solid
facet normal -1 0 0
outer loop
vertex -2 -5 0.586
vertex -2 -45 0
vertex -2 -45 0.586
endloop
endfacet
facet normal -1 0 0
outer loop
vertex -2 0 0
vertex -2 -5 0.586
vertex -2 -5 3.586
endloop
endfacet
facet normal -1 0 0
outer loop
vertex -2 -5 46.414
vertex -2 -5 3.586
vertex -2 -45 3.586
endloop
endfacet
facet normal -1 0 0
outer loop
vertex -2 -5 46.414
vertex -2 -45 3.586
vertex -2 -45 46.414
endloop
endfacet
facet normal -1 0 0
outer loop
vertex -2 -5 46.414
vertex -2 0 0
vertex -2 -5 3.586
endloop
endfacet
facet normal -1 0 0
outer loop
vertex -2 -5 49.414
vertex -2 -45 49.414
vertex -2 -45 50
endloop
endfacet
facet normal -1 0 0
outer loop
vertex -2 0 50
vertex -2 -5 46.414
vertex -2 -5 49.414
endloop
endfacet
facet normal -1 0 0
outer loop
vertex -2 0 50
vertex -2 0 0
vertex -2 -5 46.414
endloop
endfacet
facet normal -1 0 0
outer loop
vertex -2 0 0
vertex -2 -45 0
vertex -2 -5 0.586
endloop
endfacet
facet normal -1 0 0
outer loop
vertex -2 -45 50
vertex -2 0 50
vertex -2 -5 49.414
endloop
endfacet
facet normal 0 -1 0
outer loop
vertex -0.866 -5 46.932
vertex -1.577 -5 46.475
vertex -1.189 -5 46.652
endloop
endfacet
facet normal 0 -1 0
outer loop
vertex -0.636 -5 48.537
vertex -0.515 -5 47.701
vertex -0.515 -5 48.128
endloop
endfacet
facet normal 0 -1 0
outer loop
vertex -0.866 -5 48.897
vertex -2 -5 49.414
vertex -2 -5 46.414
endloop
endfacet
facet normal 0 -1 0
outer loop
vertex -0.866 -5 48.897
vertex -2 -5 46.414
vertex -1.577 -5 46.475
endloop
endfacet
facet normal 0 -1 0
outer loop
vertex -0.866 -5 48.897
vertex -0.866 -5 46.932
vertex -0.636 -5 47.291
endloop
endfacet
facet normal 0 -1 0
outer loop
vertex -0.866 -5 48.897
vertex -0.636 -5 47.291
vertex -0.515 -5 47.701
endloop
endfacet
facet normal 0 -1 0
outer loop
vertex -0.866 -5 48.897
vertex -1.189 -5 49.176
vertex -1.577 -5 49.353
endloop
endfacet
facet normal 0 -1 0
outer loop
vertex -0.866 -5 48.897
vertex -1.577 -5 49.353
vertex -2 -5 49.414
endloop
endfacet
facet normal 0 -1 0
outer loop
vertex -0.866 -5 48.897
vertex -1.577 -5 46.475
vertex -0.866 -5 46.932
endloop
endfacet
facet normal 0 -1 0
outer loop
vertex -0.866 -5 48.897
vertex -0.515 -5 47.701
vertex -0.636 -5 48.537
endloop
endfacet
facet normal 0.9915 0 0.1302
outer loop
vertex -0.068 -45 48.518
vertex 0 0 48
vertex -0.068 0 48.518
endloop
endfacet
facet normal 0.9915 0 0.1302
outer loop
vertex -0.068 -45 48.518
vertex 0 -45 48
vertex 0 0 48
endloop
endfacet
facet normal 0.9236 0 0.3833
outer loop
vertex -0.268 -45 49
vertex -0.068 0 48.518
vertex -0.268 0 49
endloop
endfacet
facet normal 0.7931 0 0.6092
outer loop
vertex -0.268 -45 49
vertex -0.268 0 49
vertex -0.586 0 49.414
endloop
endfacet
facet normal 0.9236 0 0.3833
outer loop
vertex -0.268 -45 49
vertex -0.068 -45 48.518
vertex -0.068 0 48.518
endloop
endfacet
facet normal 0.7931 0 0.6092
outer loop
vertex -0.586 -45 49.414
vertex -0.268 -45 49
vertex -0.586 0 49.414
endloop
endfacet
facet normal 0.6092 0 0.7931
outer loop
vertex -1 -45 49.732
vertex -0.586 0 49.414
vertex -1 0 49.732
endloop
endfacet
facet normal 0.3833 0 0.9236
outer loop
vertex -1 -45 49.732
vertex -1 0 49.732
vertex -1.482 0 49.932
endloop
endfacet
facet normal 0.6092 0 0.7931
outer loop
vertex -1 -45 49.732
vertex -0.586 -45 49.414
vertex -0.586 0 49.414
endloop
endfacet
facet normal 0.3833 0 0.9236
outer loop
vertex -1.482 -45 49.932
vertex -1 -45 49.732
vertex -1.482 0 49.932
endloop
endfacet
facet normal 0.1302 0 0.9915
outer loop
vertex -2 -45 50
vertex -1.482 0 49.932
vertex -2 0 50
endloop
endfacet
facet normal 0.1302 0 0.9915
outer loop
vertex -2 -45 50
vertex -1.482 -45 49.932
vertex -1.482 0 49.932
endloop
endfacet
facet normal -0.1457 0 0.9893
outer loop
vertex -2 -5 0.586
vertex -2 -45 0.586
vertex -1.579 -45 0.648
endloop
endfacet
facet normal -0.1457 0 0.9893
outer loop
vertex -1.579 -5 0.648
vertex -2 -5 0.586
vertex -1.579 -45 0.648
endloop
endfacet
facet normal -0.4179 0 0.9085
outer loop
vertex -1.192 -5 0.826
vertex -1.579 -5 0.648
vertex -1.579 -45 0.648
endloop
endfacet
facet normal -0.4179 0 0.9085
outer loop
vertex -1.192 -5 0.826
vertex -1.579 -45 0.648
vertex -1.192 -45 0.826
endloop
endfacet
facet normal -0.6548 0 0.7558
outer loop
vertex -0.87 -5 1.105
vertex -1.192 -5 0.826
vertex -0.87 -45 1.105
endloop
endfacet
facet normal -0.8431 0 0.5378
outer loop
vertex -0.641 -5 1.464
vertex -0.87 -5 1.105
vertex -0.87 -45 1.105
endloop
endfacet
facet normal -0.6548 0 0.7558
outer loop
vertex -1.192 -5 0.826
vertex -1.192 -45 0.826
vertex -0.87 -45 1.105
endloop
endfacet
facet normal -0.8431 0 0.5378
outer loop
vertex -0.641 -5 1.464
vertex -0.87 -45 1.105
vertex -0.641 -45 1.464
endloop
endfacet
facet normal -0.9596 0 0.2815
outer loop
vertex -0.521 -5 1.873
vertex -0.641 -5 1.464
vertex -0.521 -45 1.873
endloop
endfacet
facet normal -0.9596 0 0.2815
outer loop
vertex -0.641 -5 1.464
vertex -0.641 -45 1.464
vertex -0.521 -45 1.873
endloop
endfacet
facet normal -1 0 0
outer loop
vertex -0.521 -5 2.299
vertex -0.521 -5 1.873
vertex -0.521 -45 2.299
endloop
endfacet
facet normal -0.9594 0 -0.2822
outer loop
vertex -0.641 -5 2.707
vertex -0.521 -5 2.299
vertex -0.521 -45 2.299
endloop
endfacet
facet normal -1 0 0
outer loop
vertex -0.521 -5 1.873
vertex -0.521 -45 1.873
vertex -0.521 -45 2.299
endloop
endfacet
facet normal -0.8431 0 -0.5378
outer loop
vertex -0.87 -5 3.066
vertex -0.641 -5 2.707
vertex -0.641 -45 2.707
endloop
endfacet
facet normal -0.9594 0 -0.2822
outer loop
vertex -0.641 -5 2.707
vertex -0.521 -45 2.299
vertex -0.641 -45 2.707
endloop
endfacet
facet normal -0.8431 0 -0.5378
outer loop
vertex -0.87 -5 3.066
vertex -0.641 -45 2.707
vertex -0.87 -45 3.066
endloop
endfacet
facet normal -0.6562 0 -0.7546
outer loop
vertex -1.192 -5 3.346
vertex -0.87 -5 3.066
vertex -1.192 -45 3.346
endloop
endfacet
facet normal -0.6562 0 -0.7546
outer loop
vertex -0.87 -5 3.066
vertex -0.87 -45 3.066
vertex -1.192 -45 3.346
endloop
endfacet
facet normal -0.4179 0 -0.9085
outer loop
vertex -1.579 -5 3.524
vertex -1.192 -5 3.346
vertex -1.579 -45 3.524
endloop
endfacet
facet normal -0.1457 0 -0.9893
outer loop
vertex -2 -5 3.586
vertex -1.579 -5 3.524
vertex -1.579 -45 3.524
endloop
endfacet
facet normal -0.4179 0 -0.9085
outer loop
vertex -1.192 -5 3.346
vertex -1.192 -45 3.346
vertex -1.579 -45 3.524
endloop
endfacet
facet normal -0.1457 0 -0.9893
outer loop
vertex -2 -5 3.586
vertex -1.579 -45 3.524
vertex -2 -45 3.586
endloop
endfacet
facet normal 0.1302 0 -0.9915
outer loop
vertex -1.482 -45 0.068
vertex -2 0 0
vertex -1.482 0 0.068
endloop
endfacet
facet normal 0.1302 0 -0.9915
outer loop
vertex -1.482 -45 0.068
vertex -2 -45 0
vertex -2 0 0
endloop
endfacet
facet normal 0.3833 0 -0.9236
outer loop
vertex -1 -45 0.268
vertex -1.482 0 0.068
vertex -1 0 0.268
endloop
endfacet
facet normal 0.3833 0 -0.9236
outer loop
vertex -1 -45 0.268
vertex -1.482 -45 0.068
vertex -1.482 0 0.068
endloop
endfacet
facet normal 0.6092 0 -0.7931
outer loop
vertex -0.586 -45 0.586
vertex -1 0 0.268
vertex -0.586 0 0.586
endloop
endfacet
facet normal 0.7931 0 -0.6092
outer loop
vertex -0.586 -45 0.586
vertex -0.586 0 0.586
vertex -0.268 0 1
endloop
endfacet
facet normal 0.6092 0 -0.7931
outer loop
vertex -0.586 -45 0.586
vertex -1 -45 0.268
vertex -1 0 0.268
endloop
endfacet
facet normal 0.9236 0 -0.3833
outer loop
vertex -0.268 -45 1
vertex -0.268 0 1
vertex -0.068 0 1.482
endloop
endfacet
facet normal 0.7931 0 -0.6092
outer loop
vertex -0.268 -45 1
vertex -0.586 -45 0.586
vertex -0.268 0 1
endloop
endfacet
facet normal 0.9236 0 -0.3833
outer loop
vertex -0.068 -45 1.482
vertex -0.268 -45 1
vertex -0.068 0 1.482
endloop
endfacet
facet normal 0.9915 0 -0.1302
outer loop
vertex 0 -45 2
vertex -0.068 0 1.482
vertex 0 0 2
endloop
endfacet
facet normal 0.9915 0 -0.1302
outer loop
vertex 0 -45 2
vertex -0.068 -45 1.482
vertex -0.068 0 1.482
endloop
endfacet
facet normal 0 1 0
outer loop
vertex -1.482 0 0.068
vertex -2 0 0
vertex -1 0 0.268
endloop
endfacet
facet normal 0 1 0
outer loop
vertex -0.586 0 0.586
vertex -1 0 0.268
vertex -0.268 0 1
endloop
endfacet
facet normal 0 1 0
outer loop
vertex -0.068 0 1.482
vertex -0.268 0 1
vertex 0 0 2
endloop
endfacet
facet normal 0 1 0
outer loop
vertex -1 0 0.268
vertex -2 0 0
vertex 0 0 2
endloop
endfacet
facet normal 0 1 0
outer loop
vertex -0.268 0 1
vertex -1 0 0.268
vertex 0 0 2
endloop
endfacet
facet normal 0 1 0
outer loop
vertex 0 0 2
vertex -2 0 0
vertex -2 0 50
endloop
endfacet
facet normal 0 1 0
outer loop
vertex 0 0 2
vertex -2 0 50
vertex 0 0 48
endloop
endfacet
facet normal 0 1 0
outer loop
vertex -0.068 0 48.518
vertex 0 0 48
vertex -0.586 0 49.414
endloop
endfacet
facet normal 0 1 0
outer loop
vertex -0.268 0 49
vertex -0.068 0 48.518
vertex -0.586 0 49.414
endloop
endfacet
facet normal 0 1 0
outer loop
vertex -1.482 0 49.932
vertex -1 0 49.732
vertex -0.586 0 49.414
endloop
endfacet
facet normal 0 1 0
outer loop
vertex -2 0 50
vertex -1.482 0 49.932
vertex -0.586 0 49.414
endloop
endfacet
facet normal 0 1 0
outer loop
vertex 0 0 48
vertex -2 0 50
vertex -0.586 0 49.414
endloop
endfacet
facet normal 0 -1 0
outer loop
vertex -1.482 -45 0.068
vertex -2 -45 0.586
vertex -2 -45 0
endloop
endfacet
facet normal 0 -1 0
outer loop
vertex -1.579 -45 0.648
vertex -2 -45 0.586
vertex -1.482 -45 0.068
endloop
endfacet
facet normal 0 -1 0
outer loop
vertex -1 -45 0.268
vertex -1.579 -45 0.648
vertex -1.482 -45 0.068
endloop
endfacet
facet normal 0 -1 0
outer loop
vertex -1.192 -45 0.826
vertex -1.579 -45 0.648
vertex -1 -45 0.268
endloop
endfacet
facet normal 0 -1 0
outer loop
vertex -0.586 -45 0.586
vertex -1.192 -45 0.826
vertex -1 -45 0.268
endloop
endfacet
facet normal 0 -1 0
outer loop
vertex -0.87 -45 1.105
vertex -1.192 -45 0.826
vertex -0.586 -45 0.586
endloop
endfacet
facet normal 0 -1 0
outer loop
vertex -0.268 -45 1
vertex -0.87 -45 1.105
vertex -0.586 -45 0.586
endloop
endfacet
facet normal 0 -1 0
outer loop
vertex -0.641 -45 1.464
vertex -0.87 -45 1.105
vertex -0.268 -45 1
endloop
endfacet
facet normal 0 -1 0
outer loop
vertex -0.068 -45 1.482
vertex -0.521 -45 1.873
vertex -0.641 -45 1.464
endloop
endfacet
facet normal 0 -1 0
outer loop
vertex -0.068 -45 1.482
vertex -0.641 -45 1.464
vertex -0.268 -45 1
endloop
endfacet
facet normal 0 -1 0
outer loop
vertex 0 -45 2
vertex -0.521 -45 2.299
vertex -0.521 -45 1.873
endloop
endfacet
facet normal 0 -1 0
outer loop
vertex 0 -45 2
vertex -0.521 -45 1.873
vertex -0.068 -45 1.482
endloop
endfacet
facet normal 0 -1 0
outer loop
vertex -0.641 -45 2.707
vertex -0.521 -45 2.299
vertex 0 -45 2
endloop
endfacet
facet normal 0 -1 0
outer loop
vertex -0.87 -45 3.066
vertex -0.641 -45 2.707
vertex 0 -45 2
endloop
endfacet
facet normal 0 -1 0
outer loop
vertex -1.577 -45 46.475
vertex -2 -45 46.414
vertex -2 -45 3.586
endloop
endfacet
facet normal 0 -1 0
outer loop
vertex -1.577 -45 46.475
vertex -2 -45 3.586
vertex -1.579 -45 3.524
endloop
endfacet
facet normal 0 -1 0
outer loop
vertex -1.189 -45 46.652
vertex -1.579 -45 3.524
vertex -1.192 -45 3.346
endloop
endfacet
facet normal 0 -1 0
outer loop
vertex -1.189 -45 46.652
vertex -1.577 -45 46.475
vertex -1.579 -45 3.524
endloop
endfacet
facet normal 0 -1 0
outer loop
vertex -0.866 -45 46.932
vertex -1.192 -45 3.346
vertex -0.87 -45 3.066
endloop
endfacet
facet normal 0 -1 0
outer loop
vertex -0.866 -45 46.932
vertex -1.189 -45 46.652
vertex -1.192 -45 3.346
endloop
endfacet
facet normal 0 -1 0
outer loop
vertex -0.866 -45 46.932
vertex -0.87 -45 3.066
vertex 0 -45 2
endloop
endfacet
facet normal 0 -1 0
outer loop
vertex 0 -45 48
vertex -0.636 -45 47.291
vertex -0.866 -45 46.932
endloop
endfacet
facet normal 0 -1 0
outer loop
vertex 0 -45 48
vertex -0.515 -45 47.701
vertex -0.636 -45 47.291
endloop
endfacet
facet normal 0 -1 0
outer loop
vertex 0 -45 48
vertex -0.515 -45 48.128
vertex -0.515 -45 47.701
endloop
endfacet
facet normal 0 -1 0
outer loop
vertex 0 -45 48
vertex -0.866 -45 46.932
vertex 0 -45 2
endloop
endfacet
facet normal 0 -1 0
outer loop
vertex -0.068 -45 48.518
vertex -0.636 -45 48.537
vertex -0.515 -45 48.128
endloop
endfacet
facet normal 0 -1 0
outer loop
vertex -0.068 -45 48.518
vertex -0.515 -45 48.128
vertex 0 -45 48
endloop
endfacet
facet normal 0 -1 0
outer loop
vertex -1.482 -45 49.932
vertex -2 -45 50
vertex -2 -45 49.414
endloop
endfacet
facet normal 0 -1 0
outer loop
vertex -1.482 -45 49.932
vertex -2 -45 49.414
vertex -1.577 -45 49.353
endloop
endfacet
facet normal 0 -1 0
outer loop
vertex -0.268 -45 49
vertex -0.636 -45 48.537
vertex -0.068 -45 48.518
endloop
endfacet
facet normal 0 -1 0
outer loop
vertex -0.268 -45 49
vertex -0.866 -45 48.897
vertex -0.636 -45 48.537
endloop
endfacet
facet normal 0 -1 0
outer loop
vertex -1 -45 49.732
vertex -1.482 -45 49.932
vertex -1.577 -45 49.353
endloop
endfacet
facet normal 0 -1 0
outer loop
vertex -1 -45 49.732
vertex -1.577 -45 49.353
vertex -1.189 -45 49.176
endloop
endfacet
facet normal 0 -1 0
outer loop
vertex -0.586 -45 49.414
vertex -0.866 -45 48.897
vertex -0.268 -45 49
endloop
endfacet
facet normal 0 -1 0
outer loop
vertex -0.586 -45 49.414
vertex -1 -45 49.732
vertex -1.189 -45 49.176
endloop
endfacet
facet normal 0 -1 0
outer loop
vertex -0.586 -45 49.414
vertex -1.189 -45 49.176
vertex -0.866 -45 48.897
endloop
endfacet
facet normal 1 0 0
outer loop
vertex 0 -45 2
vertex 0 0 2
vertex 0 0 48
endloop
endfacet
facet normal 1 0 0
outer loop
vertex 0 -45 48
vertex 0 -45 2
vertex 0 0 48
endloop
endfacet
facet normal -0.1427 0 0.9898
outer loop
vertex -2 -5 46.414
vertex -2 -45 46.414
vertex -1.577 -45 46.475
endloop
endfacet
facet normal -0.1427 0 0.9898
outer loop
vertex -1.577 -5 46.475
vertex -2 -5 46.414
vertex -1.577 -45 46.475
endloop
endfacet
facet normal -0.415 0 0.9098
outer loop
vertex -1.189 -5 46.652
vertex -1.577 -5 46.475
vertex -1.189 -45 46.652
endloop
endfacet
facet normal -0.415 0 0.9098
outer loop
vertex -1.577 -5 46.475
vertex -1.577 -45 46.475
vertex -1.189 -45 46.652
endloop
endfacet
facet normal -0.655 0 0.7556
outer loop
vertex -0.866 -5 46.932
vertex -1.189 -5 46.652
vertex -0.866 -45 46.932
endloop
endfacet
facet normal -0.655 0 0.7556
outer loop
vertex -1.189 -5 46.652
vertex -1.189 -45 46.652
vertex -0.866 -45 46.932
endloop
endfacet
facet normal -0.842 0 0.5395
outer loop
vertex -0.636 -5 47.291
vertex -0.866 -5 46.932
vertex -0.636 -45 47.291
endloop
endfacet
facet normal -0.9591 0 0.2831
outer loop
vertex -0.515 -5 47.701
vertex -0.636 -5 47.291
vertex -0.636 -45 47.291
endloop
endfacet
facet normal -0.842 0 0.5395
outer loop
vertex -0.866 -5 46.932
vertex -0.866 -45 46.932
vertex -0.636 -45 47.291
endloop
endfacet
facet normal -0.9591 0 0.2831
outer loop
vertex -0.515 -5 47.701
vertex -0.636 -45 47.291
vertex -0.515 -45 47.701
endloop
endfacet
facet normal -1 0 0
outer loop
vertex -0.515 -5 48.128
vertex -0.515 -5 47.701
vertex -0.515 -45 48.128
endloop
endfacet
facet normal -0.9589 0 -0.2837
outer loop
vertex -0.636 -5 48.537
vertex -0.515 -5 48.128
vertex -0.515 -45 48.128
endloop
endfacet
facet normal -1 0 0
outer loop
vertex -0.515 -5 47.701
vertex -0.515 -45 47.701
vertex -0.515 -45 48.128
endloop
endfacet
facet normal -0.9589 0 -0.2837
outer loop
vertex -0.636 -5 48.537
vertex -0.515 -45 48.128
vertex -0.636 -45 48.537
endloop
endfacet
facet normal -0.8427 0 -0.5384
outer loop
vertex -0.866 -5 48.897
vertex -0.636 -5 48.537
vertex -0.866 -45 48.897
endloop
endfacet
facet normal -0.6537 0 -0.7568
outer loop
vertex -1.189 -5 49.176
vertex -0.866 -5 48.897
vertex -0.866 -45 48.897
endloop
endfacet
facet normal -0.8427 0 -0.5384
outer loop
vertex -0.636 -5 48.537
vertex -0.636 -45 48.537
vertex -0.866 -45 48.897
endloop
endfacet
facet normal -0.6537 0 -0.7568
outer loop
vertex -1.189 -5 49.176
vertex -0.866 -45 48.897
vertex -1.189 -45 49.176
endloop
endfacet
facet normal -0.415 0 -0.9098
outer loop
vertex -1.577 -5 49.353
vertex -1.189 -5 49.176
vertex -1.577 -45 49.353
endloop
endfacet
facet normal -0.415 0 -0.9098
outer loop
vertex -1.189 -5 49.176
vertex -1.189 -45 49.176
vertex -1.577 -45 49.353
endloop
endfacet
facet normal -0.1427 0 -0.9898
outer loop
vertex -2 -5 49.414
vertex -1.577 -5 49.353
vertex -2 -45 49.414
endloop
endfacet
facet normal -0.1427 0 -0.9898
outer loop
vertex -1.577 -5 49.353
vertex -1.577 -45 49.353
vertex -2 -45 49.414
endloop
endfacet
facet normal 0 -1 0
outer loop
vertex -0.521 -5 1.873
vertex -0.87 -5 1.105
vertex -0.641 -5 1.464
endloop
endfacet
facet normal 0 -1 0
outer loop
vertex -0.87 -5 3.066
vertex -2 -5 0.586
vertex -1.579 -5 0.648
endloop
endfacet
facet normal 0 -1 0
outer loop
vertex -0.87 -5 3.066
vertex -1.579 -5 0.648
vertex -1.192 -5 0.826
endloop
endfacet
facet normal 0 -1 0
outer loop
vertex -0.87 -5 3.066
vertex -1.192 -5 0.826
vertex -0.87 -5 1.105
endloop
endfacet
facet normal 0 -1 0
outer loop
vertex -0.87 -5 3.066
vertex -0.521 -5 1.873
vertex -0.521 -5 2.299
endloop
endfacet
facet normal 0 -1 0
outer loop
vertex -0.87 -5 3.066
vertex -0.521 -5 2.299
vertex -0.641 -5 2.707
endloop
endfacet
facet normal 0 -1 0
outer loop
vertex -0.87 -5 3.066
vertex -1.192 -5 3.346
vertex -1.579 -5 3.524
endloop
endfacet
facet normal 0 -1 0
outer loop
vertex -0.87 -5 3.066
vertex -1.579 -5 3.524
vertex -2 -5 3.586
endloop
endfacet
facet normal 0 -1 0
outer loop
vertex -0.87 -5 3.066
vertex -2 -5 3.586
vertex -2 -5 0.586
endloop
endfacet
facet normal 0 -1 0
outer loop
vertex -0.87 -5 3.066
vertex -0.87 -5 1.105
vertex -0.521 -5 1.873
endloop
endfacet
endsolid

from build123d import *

# Parameters (mm, degrees)
F0_W     = 2
F0_H     = 50
F1_DEPTH = 45
F2_R     = 1.99999
F4_DEPTH = 40


# Not quite as in the source:
# - a fillet or chamfer is up to 0.001 mm smaller than in the source, because OpenCascade refuses the exact size


with BuildPart() as f1:
    # F0 (on Front) → F1 (new body)
    with BuildSketch(Plane.XZ):
        with Locations((-1, 25)):
            Rectangle(F0_W, F0_H)
    extrude(amount=F1_DEPTH)

    # F2 (radius 2 in the source; OpenCascade refuses exactly that, so slightly less here)
    f2_edges = [f1.edges().sort_by_distance(p)[0] for p in [
        (0, -22.5, 0),
        (0, -22.5, 50),
    ]]
    fillet(f2_edges, radius=F2_R)

    # F3 (on face) → F4 (cut)
    with BuildSketch(Plane.XZ.offset(45)):
        with BuildLine():
            Line((-2, 49.4142135624), (-2, 46.4142135624))
            ThreePointArc((-2, 46.4142135624), (-0.5, 47.9142135624), (-2, 49.4142135624))
        make_face()
        with BuildLine():
            ThreePointArc((-2, 0.5857864376), (-0.5056576806, 2.0857757678), (-2, 3.585765098))
            Line((-2, 3.585765098), (-2, 0.5857864376))
        make_face()
    extrude(amount=-F4_DEPTH, mode=Mode.SUBTRACT)


solid = f1.part
